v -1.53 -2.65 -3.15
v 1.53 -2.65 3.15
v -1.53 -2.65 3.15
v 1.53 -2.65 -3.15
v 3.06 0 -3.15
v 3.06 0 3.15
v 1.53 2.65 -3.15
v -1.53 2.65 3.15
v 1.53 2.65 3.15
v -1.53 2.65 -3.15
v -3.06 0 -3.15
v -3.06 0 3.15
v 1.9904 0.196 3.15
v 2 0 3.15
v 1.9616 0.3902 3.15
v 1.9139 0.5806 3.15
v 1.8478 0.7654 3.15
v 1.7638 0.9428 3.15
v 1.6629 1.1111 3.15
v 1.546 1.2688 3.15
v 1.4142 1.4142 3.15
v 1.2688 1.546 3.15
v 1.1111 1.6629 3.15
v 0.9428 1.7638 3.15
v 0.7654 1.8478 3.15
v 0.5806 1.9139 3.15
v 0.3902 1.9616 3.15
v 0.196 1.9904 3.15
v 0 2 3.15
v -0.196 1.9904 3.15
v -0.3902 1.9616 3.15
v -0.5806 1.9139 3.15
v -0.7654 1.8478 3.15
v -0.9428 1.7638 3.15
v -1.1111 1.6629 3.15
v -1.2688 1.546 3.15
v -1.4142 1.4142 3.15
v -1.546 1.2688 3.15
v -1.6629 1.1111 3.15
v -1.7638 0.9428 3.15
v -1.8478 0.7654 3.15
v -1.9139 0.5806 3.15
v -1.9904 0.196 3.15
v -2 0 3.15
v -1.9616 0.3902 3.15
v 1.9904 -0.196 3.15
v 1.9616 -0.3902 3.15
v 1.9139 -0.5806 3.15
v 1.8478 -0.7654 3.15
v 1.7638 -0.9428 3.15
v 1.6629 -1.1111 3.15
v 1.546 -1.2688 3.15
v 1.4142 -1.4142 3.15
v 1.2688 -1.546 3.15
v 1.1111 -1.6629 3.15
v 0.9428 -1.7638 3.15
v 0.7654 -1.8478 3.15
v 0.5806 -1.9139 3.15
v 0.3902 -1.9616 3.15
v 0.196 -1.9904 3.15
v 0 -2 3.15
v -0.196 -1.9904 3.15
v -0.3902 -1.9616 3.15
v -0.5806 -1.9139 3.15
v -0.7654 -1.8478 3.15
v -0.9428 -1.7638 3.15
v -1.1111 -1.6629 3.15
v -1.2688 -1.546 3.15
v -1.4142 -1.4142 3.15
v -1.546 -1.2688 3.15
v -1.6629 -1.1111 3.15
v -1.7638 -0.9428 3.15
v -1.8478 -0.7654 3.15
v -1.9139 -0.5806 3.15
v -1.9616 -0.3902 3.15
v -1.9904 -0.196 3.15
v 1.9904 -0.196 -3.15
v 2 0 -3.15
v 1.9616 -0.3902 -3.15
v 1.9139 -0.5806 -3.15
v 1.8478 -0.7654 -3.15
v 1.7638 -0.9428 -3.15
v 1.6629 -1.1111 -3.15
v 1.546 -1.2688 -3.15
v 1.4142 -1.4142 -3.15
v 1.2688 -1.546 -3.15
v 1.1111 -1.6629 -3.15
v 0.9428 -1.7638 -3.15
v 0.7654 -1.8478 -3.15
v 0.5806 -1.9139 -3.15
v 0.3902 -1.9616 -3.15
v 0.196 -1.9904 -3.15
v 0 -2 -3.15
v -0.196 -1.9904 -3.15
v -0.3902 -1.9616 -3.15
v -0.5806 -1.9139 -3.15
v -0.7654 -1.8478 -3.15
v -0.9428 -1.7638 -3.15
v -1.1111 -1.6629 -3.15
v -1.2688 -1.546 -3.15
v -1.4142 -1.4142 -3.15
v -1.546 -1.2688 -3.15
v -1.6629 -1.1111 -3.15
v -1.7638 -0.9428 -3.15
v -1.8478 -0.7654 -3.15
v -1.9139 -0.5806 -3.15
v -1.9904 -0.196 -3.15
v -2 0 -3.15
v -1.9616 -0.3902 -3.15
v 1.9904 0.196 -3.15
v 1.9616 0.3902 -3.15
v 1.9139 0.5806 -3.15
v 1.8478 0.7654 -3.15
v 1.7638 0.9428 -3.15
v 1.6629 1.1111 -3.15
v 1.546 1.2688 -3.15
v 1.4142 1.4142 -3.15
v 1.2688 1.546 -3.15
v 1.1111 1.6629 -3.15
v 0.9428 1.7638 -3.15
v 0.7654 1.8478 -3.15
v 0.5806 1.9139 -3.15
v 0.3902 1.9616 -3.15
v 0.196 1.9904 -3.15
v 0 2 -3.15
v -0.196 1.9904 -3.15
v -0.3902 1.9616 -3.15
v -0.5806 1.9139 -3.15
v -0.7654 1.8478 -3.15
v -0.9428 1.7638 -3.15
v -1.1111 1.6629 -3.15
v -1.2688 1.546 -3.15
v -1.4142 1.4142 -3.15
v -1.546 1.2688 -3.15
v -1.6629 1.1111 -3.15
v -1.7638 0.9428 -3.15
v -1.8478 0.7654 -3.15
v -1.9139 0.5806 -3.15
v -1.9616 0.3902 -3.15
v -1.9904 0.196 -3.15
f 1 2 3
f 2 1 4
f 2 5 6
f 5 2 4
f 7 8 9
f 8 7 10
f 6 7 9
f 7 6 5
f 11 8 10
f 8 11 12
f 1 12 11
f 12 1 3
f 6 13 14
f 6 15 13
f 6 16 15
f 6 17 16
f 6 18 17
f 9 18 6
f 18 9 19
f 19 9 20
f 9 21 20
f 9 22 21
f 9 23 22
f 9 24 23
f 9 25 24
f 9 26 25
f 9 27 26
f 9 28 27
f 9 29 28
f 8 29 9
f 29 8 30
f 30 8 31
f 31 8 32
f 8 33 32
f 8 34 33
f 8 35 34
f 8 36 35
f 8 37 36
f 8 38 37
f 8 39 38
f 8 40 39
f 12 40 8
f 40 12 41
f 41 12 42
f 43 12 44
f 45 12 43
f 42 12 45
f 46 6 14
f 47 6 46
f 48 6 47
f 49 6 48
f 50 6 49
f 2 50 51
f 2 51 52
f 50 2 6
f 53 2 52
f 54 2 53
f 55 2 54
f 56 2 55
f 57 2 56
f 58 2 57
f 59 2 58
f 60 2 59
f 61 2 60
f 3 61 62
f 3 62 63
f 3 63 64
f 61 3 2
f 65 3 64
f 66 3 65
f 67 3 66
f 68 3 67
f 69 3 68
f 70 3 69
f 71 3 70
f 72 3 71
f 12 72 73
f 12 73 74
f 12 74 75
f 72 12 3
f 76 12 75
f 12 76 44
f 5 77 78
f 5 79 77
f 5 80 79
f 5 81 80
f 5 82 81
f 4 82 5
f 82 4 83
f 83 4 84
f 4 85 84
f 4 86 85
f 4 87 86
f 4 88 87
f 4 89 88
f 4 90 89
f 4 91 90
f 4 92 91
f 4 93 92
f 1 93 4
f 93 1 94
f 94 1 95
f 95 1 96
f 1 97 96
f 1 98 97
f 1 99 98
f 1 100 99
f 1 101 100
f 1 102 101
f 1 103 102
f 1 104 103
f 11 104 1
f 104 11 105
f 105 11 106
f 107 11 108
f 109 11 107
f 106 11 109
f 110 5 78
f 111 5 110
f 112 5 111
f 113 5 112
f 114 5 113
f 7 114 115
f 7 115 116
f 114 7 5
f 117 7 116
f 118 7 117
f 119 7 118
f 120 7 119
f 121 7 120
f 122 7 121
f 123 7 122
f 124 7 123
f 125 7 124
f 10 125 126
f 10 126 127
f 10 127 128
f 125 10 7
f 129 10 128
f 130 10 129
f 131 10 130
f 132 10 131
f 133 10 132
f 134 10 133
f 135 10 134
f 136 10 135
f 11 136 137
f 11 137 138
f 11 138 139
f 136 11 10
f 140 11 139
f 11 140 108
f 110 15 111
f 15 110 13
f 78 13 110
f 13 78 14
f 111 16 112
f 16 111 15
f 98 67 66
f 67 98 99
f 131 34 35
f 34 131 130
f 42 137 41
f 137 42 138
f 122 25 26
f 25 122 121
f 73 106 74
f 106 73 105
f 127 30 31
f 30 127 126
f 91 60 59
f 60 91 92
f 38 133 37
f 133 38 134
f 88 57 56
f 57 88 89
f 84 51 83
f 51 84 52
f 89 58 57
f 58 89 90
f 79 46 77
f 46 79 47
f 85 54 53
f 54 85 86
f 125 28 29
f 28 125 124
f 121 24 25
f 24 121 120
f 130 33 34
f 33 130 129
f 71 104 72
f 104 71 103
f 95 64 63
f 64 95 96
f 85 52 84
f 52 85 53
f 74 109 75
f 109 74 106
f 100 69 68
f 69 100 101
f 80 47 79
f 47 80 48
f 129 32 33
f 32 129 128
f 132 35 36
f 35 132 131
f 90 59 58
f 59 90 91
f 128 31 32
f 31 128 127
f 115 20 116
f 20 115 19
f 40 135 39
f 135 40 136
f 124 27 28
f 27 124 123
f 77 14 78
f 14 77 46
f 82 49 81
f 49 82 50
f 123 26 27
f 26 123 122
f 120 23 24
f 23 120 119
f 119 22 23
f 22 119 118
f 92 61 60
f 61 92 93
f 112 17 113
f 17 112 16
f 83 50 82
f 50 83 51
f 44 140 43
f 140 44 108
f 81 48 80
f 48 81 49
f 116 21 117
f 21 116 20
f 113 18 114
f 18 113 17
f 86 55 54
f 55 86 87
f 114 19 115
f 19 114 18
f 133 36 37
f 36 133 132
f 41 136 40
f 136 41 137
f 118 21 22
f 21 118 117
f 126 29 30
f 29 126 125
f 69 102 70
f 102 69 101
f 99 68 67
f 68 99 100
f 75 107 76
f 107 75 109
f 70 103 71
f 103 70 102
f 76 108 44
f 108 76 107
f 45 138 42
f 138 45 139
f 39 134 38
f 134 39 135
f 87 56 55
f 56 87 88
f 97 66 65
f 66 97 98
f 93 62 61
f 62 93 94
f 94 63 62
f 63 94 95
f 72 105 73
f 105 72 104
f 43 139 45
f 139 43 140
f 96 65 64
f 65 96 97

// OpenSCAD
$fn=64;

af = 5.3;          // across flats
thickness = 6.3;   // nut thickness
hole_d = 4.0;      // screw diameter (clearance as specified)

module hex_prism(af, h){
    r = af / sqrt(3); // circumradius for given across-flats
    cylinder(h=h, r=r, center=true, $fn=6);
}

difference(){
    hex_prism(af, thickness);
    cylinder(h=thickness + 0.4, d=hole_d, center=true, $fn=64);
}
